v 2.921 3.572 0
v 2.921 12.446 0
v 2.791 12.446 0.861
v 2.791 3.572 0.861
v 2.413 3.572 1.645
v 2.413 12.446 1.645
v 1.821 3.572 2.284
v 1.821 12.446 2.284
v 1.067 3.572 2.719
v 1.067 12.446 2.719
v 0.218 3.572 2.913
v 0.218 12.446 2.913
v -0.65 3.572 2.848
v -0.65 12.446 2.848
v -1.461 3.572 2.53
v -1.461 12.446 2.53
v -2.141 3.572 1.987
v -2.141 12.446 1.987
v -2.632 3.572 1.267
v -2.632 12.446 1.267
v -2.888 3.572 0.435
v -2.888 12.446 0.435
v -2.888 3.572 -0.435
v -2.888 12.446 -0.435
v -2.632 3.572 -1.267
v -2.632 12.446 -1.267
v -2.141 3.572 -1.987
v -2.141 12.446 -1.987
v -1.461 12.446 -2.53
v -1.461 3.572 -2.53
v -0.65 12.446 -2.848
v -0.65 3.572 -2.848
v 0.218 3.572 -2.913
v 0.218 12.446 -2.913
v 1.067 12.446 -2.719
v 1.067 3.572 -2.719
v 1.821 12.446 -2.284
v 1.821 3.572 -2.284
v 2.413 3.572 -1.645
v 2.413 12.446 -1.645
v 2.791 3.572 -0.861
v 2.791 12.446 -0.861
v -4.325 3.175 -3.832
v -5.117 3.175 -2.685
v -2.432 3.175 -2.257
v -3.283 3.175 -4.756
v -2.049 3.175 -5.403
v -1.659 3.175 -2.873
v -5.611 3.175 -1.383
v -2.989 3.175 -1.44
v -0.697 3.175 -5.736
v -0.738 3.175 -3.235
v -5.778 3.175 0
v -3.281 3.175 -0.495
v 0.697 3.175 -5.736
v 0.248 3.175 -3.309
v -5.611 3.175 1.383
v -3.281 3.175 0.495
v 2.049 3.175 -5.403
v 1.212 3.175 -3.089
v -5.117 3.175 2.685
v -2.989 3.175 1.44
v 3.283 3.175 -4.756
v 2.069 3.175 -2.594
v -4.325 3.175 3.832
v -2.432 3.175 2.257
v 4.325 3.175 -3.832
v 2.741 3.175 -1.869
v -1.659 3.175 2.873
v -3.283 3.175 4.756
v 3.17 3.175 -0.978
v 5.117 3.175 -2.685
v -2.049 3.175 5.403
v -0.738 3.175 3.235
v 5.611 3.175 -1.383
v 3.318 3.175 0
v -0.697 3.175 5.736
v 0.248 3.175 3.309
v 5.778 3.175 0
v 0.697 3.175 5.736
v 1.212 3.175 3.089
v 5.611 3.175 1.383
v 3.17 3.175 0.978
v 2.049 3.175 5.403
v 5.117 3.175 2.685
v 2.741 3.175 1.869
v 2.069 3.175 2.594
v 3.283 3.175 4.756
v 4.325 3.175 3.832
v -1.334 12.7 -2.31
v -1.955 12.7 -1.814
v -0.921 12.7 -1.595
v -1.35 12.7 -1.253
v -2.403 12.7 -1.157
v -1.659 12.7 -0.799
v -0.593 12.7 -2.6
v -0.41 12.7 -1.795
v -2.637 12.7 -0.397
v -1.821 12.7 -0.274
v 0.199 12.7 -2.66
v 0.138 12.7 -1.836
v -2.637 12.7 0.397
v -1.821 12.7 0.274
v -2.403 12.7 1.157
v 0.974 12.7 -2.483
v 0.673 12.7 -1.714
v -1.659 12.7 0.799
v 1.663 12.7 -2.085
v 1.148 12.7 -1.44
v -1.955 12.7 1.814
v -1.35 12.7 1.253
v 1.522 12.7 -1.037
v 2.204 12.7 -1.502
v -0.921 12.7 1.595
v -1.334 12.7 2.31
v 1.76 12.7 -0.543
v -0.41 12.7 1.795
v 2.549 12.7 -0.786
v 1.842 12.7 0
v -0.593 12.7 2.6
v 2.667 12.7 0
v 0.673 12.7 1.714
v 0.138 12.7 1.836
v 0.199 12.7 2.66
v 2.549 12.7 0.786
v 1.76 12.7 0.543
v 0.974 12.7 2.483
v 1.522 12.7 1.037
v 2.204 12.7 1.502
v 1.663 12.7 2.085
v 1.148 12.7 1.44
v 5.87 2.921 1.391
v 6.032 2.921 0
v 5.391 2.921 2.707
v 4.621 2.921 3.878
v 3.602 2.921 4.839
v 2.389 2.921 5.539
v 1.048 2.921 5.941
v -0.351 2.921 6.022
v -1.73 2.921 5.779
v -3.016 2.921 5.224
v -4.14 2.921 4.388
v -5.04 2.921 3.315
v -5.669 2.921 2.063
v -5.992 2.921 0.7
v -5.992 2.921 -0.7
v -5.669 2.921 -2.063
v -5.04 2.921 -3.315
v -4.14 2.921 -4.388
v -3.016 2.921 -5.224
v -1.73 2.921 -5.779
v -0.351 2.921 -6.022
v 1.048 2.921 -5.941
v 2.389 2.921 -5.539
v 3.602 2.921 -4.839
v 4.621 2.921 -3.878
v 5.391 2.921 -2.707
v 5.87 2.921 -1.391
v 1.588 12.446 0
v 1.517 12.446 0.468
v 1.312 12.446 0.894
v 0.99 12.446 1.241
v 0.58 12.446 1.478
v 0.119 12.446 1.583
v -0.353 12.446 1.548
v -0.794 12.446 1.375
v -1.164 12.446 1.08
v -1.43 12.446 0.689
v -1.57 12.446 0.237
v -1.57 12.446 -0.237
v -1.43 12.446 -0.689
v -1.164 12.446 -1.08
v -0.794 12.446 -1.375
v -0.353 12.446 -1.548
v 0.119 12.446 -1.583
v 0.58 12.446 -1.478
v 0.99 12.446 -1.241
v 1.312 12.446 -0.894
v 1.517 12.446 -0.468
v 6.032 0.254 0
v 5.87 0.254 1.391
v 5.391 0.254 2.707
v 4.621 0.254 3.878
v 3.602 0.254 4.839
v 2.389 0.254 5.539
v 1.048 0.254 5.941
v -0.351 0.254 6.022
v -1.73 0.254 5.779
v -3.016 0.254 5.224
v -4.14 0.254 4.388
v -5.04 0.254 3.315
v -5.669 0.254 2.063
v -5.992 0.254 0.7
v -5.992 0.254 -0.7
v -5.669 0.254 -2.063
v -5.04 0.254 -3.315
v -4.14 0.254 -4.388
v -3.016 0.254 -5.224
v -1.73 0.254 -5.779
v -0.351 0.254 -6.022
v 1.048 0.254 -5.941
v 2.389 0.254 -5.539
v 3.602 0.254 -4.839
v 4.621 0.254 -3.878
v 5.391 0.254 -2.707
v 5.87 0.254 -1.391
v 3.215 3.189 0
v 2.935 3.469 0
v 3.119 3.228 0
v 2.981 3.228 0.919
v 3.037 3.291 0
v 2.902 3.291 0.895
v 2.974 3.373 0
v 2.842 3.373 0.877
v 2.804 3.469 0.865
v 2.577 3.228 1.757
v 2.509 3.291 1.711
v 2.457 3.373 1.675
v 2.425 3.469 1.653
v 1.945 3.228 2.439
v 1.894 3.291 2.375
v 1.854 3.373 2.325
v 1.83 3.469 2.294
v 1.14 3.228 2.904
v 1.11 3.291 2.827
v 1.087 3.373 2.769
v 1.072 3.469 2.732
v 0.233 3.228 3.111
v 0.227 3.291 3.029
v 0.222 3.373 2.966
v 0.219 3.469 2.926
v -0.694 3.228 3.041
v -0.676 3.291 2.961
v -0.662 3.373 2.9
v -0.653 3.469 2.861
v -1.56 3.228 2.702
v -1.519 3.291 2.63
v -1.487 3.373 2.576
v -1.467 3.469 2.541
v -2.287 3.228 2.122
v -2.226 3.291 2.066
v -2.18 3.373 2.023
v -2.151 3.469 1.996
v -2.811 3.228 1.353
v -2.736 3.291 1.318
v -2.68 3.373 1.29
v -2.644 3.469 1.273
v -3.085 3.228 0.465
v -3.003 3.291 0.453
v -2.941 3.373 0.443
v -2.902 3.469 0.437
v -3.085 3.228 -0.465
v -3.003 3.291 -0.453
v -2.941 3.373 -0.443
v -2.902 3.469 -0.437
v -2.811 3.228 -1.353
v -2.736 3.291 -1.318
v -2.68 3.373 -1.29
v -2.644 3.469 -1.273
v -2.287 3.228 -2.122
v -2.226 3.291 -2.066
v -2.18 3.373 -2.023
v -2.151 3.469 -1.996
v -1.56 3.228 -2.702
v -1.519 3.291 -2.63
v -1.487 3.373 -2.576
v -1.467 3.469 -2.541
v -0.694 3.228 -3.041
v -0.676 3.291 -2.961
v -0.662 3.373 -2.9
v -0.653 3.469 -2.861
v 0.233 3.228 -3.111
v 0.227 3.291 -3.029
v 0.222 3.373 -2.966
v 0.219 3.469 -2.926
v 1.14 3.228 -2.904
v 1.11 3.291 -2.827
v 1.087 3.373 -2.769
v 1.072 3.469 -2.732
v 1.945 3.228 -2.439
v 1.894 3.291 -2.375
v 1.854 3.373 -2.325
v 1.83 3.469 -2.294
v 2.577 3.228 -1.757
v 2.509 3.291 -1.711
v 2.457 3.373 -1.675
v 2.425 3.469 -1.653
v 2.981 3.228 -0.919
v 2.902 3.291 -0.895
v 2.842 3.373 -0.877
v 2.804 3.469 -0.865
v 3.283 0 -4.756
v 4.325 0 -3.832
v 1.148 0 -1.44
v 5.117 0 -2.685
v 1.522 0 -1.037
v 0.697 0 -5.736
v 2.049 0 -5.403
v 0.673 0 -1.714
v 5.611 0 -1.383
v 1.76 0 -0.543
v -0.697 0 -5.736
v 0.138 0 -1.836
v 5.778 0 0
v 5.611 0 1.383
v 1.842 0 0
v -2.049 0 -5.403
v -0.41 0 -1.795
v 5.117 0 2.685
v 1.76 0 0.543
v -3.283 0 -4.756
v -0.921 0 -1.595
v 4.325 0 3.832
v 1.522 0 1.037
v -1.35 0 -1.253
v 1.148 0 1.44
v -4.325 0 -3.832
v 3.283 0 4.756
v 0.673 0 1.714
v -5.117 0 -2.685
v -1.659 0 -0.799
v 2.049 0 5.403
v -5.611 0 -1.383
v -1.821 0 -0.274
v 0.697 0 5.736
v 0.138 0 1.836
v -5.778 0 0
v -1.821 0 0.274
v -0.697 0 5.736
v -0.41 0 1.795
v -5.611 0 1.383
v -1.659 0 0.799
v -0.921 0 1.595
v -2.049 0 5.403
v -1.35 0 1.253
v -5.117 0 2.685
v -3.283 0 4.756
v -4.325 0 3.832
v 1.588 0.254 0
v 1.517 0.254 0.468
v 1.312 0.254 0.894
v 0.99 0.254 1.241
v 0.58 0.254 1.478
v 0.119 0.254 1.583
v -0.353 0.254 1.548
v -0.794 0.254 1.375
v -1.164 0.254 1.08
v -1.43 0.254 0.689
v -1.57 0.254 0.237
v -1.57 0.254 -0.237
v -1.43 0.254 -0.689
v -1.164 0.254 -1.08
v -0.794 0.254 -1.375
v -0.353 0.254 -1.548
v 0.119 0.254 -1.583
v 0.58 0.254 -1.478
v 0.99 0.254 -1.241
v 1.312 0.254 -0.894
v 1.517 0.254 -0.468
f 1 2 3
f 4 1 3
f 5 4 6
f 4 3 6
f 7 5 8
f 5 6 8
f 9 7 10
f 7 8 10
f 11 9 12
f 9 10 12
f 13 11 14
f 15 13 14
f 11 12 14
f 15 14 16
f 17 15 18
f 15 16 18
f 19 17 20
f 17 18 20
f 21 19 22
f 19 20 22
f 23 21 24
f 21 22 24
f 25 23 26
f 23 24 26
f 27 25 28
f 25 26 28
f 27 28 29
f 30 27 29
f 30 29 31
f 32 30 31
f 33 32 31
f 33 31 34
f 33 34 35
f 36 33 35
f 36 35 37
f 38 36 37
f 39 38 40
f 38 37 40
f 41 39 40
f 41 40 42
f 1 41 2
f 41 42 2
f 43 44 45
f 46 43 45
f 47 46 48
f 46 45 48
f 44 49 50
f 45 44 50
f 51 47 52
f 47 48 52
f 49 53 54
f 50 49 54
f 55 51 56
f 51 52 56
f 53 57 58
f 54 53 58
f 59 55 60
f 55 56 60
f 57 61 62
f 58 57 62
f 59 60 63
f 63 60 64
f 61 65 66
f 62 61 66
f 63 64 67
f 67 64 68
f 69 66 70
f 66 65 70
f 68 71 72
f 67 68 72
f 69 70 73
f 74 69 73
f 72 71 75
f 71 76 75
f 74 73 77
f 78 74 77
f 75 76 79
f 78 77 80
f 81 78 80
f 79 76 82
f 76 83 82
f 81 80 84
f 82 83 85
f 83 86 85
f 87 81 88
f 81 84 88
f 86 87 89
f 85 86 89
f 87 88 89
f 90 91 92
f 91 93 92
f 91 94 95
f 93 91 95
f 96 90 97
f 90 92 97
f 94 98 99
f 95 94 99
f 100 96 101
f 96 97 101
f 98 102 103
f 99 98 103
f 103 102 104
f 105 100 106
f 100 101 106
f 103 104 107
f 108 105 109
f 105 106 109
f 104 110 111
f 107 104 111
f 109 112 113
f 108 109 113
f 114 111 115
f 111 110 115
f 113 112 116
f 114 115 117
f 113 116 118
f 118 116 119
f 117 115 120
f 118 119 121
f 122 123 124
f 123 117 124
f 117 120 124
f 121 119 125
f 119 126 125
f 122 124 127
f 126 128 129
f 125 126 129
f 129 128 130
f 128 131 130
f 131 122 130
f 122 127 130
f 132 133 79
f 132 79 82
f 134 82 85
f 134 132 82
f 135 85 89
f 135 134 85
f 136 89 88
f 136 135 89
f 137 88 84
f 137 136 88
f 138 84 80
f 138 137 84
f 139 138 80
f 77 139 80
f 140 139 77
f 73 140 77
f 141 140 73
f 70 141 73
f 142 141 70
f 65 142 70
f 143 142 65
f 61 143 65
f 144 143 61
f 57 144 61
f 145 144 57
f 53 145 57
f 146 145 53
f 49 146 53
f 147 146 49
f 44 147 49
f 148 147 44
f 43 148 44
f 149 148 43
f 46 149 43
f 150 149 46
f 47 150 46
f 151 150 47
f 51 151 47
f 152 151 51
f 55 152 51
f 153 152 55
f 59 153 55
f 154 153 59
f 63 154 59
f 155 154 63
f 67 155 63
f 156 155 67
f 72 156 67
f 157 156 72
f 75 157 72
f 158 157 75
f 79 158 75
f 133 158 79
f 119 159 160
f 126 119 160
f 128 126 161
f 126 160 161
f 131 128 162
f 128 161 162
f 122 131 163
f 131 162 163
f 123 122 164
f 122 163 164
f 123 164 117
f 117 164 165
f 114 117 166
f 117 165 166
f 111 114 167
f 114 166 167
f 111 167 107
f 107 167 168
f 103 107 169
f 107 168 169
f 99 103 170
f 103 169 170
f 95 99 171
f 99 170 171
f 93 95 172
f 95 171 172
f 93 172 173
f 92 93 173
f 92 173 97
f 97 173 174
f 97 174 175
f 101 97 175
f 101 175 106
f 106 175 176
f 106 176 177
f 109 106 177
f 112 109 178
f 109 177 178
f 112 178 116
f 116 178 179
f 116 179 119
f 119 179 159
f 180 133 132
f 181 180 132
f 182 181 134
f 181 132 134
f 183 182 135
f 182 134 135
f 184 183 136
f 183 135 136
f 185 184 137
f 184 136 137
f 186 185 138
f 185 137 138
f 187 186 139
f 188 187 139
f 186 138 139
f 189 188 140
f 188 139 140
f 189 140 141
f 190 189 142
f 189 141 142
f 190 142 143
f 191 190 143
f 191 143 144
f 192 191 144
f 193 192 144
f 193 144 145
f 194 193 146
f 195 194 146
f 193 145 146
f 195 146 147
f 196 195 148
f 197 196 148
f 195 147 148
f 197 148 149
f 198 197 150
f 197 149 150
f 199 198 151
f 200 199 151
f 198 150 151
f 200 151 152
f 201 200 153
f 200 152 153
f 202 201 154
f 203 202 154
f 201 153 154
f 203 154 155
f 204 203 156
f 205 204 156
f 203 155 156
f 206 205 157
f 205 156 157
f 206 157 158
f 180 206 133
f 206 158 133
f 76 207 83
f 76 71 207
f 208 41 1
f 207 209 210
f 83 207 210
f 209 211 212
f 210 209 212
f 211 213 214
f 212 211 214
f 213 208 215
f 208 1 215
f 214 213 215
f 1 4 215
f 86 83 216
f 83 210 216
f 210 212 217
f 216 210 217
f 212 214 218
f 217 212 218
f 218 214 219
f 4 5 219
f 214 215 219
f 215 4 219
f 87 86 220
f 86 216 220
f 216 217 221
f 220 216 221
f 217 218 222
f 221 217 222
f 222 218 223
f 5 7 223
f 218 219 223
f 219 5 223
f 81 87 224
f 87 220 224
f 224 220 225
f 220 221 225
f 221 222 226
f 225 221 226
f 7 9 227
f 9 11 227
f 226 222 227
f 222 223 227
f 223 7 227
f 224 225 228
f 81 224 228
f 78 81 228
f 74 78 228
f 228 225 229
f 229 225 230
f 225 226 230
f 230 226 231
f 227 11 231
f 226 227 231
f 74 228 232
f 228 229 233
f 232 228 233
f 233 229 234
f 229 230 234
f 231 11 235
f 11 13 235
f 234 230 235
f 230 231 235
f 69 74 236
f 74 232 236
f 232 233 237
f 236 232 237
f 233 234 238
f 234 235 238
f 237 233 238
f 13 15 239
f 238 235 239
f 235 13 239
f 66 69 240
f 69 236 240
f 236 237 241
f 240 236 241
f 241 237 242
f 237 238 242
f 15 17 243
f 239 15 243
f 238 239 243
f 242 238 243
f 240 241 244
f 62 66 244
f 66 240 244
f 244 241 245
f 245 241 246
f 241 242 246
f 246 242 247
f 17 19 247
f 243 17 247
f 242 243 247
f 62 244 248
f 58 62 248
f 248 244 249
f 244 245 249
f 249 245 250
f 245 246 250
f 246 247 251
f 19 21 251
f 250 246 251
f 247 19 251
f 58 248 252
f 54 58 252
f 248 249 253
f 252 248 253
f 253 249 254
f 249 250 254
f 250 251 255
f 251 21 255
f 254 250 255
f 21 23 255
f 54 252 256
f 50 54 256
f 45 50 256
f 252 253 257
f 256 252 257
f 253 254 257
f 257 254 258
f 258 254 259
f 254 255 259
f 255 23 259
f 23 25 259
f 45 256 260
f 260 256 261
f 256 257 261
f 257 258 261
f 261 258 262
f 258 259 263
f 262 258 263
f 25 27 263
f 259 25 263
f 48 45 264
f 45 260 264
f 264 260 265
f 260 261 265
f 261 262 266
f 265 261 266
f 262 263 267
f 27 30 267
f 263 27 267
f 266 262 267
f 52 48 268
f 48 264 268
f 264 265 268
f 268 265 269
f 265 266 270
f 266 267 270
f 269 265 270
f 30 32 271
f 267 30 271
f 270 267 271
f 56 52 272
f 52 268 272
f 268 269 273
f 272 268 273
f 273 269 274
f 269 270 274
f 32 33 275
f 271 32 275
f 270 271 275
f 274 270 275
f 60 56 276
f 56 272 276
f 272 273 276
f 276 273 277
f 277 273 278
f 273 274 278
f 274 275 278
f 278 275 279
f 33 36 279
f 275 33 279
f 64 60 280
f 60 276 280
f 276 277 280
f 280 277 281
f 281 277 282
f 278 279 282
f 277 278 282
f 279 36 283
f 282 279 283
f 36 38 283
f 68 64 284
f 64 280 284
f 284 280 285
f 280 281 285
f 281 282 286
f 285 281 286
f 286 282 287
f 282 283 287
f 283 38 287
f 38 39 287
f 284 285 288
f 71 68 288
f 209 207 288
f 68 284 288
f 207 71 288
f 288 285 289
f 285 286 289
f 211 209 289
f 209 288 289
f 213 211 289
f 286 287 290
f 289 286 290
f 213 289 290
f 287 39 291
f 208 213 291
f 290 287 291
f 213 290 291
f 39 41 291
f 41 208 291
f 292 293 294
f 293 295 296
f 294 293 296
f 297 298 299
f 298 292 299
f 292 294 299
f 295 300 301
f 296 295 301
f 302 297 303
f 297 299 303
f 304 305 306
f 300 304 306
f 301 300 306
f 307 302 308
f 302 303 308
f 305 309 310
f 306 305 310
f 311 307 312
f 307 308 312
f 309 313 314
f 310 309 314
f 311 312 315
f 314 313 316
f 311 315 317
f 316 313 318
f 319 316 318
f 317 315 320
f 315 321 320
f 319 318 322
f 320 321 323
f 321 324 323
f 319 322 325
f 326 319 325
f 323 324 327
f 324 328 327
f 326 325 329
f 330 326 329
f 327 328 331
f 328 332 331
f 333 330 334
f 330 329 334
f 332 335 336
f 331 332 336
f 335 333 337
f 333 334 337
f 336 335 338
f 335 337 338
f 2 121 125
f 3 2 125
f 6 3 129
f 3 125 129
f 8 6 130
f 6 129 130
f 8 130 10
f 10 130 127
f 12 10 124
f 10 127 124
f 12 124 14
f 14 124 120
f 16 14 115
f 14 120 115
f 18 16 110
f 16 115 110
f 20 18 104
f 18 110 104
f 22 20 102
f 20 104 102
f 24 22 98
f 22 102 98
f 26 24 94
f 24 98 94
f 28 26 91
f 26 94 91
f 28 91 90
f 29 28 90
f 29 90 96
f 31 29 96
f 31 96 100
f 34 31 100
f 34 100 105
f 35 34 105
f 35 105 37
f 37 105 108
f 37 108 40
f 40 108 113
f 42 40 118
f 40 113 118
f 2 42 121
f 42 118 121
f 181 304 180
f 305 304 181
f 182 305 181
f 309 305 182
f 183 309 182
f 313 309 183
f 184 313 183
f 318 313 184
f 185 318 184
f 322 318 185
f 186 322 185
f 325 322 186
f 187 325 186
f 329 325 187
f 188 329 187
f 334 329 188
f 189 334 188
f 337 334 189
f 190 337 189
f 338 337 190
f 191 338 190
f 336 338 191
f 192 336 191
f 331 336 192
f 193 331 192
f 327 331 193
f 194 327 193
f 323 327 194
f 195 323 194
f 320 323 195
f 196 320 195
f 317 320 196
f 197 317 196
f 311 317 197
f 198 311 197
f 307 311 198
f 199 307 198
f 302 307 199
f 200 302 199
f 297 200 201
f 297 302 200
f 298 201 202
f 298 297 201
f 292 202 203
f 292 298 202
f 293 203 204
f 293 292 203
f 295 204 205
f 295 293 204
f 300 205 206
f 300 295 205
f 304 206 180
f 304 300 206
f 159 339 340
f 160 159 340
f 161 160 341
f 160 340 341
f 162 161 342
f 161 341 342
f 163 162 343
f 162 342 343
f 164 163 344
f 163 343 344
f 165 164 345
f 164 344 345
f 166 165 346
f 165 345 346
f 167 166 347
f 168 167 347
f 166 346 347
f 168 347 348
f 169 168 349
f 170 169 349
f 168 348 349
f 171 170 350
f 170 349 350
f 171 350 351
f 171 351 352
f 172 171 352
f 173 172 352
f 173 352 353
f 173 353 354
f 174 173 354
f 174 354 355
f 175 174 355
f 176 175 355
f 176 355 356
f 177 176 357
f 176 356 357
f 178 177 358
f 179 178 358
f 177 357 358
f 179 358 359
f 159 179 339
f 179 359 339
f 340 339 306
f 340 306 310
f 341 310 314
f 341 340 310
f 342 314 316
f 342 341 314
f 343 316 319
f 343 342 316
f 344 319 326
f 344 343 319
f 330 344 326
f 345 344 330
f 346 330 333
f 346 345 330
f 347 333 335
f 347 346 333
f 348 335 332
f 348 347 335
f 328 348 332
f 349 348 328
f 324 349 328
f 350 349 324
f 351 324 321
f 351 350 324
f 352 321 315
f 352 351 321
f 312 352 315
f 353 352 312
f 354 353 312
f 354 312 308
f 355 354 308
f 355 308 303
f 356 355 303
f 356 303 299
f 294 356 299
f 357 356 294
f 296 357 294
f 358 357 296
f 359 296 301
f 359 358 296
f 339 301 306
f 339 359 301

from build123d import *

# Parameters (mm, degrees)
FILLET1_R     = 0.396875
CHAMFER1_SIZE = 0.254


with BuildPart() as part:
    # Sketch1 → Revolve1 (revolve)
    with BuildSketch(Plane.XY):
        Polygon((1.5875, 0), (6.0325, 0), (6.0325, 3.175), (2.921, 3.175), (2.921, 12.7), (1.5875, 12.7), align=None)
    revolve(axis=Axis((0, 7.886499903, 0), (0, -1, 0)))

    # Fillet1
    fillet1_edges = [part.edges().sort_by_distance(p)[0] for p in [
        (-2.921, 3.175, 0),
    ]]
    fillet(fillet1_edges, radius=FILLET1_R)

    # Chamfer1
    chamfer1_edges = [part.edges().sort_by_distance(p)[0] for p in [
        (-1.5875, 12.7, 0),
        (-2.921, 12.7, 0),
        (-6.0325, 3.175, 0),
        (-6.0325, 0, 0),
        (-1.5875, 0, 0),
    ]]
    chamfer(chamfer1_edges, length=CHAMFER1_SIZE)


solid = part.part
